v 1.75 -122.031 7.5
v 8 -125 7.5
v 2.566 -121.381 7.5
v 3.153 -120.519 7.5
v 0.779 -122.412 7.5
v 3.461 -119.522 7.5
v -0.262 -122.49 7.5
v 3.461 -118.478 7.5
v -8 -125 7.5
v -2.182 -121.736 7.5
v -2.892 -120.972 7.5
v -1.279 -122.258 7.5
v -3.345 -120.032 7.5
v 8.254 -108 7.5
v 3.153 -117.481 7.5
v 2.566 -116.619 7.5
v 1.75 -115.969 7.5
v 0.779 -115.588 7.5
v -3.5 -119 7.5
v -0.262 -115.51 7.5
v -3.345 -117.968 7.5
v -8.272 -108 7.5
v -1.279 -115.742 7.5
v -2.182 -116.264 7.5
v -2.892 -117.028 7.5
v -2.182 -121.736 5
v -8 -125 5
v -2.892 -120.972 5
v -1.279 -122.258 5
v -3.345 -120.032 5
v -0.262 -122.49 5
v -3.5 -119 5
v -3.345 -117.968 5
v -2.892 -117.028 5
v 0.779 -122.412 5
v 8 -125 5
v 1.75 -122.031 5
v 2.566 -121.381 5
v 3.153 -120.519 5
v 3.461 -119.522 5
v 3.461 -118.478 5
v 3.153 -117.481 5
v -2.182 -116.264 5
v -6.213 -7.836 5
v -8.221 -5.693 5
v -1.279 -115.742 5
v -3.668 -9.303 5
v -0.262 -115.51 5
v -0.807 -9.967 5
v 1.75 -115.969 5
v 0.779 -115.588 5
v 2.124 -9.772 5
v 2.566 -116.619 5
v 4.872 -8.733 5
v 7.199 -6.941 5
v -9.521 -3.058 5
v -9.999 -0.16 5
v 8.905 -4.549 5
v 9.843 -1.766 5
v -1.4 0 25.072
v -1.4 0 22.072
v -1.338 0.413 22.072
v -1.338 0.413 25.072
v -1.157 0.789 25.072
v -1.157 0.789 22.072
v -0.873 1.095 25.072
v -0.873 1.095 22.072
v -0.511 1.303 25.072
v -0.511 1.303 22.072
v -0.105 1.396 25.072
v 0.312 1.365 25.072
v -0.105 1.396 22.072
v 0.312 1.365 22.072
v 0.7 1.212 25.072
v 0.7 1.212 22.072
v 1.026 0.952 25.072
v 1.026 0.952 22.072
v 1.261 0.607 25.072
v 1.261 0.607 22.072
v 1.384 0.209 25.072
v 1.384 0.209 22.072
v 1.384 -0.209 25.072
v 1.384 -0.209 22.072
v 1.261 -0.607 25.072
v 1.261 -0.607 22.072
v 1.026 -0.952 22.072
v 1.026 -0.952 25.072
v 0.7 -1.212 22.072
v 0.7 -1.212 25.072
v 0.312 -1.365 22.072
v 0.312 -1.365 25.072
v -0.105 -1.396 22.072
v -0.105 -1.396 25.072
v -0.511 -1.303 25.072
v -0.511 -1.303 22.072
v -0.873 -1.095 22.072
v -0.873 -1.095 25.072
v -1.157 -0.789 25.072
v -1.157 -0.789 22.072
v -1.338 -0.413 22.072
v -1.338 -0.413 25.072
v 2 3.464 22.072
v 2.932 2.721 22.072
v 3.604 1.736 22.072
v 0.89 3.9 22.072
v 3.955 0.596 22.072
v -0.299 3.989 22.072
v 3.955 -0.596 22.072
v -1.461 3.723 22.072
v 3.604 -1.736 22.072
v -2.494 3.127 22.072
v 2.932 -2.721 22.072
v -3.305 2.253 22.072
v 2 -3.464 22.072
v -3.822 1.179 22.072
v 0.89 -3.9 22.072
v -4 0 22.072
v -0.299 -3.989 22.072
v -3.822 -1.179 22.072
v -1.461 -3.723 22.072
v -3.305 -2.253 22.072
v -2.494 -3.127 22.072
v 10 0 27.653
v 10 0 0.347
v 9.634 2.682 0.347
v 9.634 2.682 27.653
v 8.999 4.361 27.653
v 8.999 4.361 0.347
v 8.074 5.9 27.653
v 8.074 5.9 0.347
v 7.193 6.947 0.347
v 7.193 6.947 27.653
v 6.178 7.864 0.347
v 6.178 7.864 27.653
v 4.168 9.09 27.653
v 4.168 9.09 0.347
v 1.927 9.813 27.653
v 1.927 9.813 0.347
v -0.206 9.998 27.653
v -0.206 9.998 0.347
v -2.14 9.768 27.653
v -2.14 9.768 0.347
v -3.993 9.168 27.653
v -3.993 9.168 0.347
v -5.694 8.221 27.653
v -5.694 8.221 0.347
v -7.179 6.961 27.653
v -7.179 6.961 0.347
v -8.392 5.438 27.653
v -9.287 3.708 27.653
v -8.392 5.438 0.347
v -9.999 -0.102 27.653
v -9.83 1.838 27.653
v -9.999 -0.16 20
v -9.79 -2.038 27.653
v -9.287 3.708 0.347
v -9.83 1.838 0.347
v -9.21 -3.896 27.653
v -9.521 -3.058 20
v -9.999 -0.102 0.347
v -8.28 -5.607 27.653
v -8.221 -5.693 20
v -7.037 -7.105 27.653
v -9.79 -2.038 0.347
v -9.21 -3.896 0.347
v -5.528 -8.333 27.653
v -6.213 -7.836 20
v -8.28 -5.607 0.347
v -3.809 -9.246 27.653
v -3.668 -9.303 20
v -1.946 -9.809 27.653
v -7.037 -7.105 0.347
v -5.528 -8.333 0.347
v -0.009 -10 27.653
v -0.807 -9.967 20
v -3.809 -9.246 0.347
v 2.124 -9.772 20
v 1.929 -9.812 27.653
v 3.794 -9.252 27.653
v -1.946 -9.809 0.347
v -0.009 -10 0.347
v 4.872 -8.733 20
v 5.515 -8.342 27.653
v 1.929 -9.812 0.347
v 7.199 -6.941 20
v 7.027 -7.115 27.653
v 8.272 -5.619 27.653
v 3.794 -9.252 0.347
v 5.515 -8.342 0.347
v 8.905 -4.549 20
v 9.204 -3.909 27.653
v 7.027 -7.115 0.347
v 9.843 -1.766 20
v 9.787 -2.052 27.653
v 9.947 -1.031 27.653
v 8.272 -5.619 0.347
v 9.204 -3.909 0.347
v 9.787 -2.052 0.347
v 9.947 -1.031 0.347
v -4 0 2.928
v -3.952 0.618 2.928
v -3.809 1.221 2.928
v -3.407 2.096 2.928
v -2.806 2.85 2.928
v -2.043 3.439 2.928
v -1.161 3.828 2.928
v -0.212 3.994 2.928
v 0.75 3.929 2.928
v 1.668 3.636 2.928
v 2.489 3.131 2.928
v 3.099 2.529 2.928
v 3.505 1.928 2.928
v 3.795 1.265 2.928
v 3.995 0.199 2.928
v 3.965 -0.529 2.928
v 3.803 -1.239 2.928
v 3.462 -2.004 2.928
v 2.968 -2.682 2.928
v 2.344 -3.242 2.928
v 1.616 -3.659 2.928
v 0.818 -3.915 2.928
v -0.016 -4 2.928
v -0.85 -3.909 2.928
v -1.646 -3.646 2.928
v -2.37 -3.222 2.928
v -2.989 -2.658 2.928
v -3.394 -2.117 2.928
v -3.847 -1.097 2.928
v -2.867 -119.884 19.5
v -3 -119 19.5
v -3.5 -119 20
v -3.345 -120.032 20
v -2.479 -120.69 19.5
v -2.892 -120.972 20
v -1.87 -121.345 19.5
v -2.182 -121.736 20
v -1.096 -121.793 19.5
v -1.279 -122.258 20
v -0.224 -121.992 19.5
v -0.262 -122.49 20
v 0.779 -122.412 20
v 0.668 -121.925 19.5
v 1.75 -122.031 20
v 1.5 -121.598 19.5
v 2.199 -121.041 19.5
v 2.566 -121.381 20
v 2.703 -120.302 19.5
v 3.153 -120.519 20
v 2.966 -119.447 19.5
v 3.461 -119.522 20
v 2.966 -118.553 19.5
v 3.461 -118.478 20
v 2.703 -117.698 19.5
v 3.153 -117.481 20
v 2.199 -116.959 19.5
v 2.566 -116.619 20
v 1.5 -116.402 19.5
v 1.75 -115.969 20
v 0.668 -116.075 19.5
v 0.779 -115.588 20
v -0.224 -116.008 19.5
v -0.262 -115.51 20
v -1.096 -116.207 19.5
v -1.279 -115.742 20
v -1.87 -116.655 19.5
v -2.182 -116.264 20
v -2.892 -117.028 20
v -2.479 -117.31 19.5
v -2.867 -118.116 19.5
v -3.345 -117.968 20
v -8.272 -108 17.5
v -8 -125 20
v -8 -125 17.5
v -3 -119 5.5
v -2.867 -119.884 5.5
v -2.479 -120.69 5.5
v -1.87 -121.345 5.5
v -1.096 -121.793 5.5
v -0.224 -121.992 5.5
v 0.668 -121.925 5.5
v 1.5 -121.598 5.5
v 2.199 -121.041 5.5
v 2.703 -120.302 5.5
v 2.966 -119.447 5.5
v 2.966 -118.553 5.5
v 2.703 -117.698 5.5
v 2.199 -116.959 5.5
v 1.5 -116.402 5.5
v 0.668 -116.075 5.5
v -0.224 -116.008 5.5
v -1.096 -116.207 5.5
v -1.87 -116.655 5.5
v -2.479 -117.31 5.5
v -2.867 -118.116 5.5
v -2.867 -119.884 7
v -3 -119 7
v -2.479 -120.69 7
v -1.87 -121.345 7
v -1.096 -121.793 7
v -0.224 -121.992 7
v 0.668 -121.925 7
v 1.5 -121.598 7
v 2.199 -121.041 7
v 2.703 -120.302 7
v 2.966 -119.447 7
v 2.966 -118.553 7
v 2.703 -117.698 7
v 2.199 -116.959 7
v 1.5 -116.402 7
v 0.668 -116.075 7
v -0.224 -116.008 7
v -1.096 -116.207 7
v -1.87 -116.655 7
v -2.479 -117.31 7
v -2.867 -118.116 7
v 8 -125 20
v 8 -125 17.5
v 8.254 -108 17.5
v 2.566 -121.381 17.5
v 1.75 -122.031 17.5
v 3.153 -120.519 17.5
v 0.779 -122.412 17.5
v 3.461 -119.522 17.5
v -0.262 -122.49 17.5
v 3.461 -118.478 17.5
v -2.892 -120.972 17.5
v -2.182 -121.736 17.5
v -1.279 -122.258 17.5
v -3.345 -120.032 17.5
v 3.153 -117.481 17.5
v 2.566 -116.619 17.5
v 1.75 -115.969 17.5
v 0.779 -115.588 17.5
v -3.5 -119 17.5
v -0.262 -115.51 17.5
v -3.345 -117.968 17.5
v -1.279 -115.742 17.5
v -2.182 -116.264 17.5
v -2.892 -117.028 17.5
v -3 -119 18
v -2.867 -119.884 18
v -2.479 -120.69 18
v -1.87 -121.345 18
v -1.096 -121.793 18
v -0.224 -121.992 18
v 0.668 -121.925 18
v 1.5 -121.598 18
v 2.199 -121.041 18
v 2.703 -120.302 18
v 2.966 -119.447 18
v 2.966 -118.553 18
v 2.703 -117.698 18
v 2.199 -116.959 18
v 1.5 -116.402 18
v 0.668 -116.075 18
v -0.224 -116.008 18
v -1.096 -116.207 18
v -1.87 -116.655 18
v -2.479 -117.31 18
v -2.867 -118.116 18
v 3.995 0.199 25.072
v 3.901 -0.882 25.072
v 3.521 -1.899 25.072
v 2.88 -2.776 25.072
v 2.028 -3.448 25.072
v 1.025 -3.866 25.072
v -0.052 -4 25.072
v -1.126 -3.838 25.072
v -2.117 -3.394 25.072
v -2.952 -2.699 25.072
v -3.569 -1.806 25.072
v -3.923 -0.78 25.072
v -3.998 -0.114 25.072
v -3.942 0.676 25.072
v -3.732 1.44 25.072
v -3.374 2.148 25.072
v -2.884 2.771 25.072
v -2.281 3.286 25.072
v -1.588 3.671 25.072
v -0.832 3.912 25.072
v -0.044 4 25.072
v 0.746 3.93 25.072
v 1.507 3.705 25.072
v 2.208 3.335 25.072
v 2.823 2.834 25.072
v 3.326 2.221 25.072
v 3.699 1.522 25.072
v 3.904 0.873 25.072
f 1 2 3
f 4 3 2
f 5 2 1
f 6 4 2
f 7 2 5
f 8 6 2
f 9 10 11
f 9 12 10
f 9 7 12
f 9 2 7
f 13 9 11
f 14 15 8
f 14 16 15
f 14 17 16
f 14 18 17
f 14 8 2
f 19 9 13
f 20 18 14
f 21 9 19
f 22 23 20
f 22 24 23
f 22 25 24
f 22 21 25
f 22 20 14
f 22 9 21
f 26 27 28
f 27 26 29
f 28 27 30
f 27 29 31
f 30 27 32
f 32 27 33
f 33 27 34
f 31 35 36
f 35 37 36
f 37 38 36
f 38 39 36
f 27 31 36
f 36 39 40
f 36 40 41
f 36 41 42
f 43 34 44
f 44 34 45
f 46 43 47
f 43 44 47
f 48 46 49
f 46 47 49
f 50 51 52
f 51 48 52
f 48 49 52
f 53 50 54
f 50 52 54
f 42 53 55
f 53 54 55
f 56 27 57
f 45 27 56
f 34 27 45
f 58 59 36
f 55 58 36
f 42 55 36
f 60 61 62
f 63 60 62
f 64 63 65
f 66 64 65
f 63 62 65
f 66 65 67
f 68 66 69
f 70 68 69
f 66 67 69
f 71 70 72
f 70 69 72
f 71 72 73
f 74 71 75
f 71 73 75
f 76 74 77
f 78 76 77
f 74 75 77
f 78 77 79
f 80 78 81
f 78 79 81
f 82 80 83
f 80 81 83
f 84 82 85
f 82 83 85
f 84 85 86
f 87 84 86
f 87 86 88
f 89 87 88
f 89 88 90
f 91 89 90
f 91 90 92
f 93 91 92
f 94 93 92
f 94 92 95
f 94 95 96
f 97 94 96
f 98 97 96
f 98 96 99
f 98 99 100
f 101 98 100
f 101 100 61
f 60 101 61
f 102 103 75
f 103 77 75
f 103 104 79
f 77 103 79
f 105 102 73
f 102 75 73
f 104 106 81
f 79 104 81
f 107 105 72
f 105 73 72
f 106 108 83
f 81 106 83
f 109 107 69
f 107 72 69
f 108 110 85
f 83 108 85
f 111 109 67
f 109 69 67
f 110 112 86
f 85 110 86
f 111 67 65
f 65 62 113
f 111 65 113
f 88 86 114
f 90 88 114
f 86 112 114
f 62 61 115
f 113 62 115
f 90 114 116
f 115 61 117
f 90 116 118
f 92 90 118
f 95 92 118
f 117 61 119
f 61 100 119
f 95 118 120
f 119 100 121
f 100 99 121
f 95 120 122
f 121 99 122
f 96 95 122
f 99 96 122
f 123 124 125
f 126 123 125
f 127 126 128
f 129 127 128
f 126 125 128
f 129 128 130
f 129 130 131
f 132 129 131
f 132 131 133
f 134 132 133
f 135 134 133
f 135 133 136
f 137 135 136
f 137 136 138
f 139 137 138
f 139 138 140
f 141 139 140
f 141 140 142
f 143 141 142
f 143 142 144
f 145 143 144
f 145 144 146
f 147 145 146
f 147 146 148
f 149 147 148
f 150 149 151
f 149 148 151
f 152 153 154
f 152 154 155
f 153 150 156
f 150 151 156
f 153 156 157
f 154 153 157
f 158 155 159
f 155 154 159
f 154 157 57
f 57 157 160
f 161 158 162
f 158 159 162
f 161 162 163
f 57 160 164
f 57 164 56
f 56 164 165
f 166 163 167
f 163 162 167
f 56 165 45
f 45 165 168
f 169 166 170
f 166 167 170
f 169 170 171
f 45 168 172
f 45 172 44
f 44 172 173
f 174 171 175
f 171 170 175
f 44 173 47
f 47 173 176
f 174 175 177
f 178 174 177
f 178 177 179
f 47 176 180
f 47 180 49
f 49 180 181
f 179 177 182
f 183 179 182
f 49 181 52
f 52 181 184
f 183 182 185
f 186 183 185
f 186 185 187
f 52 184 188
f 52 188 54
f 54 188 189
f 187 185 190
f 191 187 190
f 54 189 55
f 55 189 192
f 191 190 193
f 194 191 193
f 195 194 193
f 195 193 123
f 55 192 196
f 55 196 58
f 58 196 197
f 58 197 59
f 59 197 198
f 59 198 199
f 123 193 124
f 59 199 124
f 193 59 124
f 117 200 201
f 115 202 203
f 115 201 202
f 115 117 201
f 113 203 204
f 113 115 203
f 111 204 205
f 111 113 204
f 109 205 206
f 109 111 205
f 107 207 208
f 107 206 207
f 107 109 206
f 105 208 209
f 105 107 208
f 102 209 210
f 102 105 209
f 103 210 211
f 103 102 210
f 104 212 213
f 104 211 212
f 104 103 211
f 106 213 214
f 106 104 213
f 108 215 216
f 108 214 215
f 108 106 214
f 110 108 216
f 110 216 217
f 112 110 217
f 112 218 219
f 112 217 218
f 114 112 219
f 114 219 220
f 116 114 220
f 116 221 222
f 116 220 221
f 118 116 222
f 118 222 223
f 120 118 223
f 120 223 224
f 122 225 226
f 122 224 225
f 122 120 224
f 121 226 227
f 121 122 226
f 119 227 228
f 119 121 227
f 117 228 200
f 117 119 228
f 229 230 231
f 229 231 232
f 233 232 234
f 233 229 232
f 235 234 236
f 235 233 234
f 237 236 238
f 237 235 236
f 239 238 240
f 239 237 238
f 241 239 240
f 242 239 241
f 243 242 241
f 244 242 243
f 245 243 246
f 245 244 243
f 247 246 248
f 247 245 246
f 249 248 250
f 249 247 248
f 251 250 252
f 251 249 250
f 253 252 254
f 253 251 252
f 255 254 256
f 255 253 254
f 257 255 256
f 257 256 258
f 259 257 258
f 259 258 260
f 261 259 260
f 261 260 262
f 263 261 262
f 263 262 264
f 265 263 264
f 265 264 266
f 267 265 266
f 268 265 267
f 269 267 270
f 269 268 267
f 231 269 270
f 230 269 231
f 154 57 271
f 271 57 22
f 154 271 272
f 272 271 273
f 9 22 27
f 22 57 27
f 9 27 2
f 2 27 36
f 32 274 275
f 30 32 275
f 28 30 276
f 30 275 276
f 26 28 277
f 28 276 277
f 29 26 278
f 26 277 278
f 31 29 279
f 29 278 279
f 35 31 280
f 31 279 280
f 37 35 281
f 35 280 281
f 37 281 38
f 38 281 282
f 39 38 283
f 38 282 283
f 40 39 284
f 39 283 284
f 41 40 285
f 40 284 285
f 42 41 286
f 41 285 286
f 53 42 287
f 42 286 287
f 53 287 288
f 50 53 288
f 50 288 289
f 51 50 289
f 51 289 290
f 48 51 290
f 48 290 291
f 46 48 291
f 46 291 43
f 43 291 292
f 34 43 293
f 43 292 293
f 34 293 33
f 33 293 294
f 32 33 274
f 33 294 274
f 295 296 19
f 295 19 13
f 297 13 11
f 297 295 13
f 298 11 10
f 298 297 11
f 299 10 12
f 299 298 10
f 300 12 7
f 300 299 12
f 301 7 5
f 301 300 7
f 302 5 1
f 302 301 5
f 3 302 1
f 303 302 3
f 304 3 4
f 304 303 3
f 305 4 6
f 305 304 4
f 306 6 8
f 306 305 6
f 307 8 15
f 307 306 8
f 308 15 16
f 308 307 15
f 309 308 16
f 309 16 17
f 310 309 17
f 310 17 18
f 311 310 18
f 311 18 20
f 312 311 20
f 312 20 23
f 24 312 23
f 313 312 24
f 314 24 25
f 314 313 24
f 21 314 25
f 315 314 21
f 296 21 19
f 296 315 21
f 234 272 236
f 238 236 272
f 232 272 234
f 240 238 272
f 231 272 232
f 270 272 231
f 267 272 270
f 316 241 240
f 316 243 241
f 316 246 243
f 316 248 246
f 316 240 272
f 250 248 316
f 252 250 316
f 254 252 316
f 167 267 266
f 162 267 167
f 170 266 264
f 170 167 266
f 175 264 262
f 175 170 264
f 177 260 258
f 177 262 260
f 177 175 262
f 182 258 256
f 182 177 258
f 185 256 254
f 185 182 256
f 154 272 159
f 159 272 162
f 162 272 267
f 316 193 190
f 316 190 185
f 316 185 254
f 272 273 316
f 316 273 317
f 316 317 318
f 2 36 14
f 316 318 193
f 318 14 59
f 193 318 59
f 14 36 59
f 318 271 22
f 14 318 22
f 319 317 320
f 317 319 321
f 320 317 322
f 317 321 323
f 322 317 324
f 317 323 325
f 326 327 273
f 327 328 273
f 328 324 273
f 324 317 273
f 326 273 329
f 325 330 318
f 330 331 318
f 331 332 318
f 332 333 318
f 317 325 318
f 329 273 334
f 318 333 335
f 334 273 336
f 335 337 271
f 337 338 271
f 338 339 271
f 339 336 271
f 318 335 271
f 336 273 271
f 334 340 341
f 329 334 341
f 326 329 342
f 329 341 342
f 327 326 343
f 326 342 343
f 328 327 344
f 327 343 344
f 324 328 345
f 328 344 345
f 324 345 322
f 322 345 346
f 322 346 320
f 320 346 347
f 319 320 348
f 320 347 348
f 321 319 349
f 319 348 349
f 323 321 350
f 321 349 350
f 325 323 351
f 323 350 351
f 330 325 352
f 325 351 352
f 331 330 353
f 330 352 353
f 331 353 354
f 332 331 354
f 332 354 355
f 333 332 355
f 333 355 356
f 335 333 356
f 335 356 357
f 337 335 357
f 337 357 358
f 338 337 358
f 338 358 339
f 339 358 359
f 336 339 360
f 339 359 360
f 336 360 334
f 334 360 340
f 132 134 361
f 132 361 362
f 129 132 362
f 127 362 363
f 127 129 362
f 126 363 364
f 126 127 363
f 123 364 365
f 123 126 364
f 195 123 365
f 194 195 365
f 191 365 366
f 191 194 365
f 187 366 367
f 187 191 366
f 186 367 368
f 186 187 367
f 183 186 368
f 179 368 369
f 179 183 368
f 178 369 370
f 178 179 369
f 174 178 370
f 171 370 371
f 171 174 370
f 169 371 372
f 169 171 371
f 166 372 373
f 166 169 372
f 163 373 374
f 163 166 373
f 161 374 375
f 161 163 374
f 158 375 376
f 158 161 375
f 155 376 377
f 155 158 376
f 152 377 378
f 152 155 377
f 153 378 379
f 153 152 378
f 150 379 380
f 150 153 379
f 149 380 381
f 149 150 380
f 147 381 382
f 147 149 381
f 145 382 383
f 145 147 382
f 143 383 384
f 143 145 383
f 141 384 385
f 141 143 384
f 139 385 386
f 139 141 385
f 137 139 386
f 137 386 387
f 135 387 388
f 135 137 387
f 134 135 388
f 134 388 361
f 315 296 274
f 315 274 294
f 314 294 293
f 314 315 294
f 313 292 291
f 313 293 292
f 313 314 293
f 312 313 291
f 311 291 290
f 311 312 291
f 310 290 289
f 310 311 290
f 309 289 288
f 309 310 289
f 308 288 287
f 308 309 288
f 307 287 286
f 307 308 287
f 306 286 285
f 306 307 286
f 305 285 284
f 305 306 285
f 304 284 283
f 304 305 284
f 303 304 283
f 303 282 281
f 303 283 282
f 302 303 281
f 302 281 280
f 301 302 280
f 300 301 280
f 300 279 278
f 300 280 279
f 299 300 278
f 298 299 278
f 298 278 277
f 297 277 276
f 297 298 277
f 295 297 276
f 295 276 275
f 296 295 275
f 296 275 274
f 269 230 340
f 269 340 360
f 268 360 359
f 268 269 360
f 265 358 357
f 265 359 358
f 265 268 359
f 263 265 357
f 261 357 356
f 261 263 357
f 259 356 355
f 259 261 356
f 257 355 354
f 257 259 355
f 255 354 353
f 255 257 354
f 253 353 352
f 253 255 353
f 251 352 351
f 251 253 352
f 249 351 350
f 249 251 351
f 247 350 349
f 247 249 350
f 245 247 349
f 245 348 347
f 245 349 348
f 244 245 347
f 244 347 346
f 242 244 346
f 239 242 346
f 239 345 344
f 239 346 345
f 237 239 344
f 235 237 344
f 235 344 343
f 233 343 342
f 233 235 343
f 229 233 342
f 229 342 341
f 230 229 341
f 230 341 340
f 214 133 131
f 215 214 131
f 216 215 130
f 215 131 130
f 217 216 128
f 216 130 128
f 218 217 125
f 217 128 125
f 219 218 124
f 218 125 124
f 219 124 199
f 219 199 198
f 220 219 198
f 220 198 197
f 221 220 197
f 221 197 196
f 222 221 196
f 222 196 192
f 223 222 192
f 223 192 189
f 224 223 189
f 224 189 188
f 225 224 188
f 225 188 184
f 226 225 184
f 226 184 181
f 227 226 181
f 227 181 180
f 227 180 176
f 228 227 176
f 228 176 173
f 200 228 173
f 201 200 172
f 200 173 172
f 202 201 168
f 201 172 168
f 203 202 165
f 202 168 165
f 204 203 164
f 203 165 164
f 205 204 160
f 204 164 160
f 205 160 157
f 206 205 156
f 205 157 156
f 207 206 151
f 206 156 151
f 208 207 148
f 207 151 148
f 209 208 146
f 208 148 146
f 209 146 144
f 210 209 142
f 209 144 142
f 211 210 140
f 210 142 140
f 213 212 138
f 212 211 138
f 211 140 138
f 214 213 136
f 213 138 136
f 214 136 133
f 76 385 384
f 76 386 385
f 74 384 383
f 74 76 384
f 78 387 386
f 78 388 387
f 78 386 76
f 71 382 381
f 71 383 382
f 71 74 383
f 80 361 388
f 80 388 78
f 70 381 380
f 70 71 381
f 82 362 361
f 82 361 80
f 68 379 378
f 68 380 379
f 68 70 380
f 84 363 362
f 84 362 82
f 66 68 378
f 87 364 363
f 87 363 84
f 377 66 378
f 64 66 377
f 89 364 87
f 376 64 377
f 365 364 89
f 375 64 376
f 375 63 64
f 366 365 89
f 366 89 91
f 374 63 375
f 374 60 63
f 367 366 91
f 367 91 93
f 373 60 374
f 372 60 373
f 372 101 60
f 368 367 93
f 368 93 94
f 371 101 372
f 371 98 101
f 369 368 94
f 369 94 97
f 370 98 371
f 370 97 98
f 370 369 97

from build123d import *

# Parameters (mm, degrees)
SKETCH_1_R               = 10
EXTRUDE_1_DEPTH          = 28
EXTRUDE_START            = -15
EXTRUDE_2_DEPTH          = 15
CUT_EXTRUDE_2_DEPTH      = 128.720701533
CUT_EXTRUDE_2_DEPTH_BACK = 128.720701533
SKETCH_3_R               = 4
CUT_EXTRUDE_3_DEPTH      = 129.412129246
CUT_EXTRUDE_3_DEPTH_BACK = 129.412129246
SKETCH_7_W               = 10
SKETCH_7_H               = 22
CUT_EXTRUDE_4_DEPTH      = 128.428989534
CUT_EXTRUDE_4_DEPTH_BACK = 128.428989534
SKETCH_8_R               = 3
EXTRUDE_START_2          = -3
SKETCH_9_R               = 4
EXTRUDE_3_DEPTH          = 3
SKETCH_10_R              = 1.4
CUT_EXTRUDE_5_DEPTH      = 128.267326381
CHAMFER_1_SIZE           = 0.5


with BuildPart() as part:
    # 草图1 → 凸台-拉伸1 (new body)
    with BuildSketch(Plane.XY):
        Circle(SKETCH_1_R)
    extrude(amount=EXTRUDE_1_DEPTH)

    # 草图2 → 凸台-拉伸2 (add)
    with BuildSketch(Plane.XY.offset(20).offset(EXTRUDE_START)):
        with BuildLine():
            Line((-9.998718605, -0.160082009), (-8, -125))
            Line((-8, -125), (8, -125))
            Line((8, -125), (9.842868133, -1.765770913))
            ThreePointArc((9.842868133, -1.765770913), (-0.806617354, -9.967415334), (-9.998718605, -0.160082009))
        make_face()
    extrude(amount=EXTRUDE_2_DEPTH)

    # 草图3 → 切除-拉伸2 (cut, two sides: drawn at the far end of the back side and taken through both)
    with BuildSketch(Plane(origin=(0, 0, 3.76), x_dir=(-1, 0, 0), z_dir=(0, 0, -1)).offset(-CUT_EXTRUDE_2_DEPTH_BACK)):
        Circle(SKETCH_3_R)
    extrude(amount=CUT_EXTRUDE_2_DEPTH + CUT_EXTRUDE_2_DEPTH_BACK, mode=Mode.SUBTRACT)

    # 切除-放样2: read off the stored shape, not the designer's step
    # 切除-放样2: loft between two sections, ruled curve by curve
    loft_2_from = [
        Edge.make_bspline([(3.291276386, -2.27321353, 3.76), (-1.255150675, -8.855766301, 3.76), (-7.837703446, -4.309339241, 3.76), (-3.291276386, 2.27321353, 3.76), (1.255150675, 8.855766301, 3.76), (7.837703446, 4.309339241, 3.76), (3.291276386, -2.27321353, 3.76)], [0, 0, 0, 0, 0.5, 0.5, 0.5, 1, 1, 1, 1], 3, [1, 0.333333333, 0.333333333, 1, 0.333333333, 0.333333333, 1]),
    ]
    loft_2_to = [
        Edge.make_bspline([(6.471228023, 8.895122702, 0), (24.261473426, -4.047333344, 0), (11.319017381, -21.837578747, 0), (-6.471228023, -8.895122702, 0), (-24.261473426, 4.047333344, 0), (-11.319017381, 21.837578747, 0), (6.471228023, 8.895122702, 0)], [0, 0, 0, 0, 0.5, 0.5, 0.5, 1, 1, 1, 1], 3, [1, 0.333333333, 0.333333333, 1, 0.333333333, 0.333333333, 1]),
    ]
    loft_2 = Solid(Shell([*[Face.make_surface_from_curves(loft_2_from[k], loft_2_to[k]) for k in range(1)], Face(Wire(loft_2_from)), Face(Wire(loft_2_to))]))
    add(loft_2, mode=Mode.SUBTRACT)

    # 镜向1: 切除-放样2 across plane
    add(loft_2.mirror(Plane(origin=(0, 0, 14), x_dir=(1, 0, 0), z_dir=(0, 0, -1))), mode=Mode.SUBTRACT)

    # 草图7 → 切除-拉伸3 (cut, two sides: drawn at the far end of the back side and taken through both)
    with BuildSketch(Plane(origin=(0, 0, 0), x_dir=(0, 0, -1), z_dir=(1, 0, 0)).offset(-CUT_EXTRUDE_3_DEPTH_BACK)):
        with Locations((-12.5, -119)):
            Rectangle(SKETCH_7_W, SKETCH_7_H)
    extrude(amount=CUT_EXTRUDE_3_DEPTH + CUT_EXTRUDE_3_DEPTH_BACK, mode=Mode.SUBTRACT)

    # 草图8 → 切除-拉伸4 (cut, two sides: drawn at the far end of the back side and taken through both)
    with BuildSketch(Plane(origin=(0, 0, 5), x_dir=(-1, 0, 0), z_dir=(0, 0, -1)).offset(-CUT_EXTRUDE_4_DEPTH_BACK)):
        with Locations((0, -119)):
            Circle(SKETCH_8_R)
    extrude(amount=CUT_EXTRUDE_4_DEPTH + CUT_EXTRUDE_4_DEPTH_BACK, mode=Mode.SUBTRACT)

    # 草图9 → 凸台-拉伸3 (add)
    with BuildSketch(Plane.XY.offset(25.072168523).offset(EXTRUDE_START_2)):
        with Locations(Location((0, 0, 0), (0, 0, 180))):
            Circle(SKETCH_9_R)
    extrude(amount=EXTRUDE_3_DEPTH)

    # 草图10 → 切除-拉伸5 (cut, through all)
    with BuildSketch(Plane(origin=(0, 0, 22.072168523), x_dir=(-1, 0, 0), z_dir=(0, 0, -1))):
        Circle(SKETCH_10_R)
    extrude(amount=-CUT_EXTRUDE_5_DEPTH, mode=Mode.SUBTRACT)

    # 倒角1
    chamfer_1_edges = [part.edges().sort_by_distance(p)[0] for p in [
        (3, -119, 7.5),
        (3, -119, 5),
        (3, -119, 20),
        (3, -119, 17.5),
    ]]
    chamfer(chamfer_1_edges, length=CHAMFER_1_SIZE)


solid = part.part
